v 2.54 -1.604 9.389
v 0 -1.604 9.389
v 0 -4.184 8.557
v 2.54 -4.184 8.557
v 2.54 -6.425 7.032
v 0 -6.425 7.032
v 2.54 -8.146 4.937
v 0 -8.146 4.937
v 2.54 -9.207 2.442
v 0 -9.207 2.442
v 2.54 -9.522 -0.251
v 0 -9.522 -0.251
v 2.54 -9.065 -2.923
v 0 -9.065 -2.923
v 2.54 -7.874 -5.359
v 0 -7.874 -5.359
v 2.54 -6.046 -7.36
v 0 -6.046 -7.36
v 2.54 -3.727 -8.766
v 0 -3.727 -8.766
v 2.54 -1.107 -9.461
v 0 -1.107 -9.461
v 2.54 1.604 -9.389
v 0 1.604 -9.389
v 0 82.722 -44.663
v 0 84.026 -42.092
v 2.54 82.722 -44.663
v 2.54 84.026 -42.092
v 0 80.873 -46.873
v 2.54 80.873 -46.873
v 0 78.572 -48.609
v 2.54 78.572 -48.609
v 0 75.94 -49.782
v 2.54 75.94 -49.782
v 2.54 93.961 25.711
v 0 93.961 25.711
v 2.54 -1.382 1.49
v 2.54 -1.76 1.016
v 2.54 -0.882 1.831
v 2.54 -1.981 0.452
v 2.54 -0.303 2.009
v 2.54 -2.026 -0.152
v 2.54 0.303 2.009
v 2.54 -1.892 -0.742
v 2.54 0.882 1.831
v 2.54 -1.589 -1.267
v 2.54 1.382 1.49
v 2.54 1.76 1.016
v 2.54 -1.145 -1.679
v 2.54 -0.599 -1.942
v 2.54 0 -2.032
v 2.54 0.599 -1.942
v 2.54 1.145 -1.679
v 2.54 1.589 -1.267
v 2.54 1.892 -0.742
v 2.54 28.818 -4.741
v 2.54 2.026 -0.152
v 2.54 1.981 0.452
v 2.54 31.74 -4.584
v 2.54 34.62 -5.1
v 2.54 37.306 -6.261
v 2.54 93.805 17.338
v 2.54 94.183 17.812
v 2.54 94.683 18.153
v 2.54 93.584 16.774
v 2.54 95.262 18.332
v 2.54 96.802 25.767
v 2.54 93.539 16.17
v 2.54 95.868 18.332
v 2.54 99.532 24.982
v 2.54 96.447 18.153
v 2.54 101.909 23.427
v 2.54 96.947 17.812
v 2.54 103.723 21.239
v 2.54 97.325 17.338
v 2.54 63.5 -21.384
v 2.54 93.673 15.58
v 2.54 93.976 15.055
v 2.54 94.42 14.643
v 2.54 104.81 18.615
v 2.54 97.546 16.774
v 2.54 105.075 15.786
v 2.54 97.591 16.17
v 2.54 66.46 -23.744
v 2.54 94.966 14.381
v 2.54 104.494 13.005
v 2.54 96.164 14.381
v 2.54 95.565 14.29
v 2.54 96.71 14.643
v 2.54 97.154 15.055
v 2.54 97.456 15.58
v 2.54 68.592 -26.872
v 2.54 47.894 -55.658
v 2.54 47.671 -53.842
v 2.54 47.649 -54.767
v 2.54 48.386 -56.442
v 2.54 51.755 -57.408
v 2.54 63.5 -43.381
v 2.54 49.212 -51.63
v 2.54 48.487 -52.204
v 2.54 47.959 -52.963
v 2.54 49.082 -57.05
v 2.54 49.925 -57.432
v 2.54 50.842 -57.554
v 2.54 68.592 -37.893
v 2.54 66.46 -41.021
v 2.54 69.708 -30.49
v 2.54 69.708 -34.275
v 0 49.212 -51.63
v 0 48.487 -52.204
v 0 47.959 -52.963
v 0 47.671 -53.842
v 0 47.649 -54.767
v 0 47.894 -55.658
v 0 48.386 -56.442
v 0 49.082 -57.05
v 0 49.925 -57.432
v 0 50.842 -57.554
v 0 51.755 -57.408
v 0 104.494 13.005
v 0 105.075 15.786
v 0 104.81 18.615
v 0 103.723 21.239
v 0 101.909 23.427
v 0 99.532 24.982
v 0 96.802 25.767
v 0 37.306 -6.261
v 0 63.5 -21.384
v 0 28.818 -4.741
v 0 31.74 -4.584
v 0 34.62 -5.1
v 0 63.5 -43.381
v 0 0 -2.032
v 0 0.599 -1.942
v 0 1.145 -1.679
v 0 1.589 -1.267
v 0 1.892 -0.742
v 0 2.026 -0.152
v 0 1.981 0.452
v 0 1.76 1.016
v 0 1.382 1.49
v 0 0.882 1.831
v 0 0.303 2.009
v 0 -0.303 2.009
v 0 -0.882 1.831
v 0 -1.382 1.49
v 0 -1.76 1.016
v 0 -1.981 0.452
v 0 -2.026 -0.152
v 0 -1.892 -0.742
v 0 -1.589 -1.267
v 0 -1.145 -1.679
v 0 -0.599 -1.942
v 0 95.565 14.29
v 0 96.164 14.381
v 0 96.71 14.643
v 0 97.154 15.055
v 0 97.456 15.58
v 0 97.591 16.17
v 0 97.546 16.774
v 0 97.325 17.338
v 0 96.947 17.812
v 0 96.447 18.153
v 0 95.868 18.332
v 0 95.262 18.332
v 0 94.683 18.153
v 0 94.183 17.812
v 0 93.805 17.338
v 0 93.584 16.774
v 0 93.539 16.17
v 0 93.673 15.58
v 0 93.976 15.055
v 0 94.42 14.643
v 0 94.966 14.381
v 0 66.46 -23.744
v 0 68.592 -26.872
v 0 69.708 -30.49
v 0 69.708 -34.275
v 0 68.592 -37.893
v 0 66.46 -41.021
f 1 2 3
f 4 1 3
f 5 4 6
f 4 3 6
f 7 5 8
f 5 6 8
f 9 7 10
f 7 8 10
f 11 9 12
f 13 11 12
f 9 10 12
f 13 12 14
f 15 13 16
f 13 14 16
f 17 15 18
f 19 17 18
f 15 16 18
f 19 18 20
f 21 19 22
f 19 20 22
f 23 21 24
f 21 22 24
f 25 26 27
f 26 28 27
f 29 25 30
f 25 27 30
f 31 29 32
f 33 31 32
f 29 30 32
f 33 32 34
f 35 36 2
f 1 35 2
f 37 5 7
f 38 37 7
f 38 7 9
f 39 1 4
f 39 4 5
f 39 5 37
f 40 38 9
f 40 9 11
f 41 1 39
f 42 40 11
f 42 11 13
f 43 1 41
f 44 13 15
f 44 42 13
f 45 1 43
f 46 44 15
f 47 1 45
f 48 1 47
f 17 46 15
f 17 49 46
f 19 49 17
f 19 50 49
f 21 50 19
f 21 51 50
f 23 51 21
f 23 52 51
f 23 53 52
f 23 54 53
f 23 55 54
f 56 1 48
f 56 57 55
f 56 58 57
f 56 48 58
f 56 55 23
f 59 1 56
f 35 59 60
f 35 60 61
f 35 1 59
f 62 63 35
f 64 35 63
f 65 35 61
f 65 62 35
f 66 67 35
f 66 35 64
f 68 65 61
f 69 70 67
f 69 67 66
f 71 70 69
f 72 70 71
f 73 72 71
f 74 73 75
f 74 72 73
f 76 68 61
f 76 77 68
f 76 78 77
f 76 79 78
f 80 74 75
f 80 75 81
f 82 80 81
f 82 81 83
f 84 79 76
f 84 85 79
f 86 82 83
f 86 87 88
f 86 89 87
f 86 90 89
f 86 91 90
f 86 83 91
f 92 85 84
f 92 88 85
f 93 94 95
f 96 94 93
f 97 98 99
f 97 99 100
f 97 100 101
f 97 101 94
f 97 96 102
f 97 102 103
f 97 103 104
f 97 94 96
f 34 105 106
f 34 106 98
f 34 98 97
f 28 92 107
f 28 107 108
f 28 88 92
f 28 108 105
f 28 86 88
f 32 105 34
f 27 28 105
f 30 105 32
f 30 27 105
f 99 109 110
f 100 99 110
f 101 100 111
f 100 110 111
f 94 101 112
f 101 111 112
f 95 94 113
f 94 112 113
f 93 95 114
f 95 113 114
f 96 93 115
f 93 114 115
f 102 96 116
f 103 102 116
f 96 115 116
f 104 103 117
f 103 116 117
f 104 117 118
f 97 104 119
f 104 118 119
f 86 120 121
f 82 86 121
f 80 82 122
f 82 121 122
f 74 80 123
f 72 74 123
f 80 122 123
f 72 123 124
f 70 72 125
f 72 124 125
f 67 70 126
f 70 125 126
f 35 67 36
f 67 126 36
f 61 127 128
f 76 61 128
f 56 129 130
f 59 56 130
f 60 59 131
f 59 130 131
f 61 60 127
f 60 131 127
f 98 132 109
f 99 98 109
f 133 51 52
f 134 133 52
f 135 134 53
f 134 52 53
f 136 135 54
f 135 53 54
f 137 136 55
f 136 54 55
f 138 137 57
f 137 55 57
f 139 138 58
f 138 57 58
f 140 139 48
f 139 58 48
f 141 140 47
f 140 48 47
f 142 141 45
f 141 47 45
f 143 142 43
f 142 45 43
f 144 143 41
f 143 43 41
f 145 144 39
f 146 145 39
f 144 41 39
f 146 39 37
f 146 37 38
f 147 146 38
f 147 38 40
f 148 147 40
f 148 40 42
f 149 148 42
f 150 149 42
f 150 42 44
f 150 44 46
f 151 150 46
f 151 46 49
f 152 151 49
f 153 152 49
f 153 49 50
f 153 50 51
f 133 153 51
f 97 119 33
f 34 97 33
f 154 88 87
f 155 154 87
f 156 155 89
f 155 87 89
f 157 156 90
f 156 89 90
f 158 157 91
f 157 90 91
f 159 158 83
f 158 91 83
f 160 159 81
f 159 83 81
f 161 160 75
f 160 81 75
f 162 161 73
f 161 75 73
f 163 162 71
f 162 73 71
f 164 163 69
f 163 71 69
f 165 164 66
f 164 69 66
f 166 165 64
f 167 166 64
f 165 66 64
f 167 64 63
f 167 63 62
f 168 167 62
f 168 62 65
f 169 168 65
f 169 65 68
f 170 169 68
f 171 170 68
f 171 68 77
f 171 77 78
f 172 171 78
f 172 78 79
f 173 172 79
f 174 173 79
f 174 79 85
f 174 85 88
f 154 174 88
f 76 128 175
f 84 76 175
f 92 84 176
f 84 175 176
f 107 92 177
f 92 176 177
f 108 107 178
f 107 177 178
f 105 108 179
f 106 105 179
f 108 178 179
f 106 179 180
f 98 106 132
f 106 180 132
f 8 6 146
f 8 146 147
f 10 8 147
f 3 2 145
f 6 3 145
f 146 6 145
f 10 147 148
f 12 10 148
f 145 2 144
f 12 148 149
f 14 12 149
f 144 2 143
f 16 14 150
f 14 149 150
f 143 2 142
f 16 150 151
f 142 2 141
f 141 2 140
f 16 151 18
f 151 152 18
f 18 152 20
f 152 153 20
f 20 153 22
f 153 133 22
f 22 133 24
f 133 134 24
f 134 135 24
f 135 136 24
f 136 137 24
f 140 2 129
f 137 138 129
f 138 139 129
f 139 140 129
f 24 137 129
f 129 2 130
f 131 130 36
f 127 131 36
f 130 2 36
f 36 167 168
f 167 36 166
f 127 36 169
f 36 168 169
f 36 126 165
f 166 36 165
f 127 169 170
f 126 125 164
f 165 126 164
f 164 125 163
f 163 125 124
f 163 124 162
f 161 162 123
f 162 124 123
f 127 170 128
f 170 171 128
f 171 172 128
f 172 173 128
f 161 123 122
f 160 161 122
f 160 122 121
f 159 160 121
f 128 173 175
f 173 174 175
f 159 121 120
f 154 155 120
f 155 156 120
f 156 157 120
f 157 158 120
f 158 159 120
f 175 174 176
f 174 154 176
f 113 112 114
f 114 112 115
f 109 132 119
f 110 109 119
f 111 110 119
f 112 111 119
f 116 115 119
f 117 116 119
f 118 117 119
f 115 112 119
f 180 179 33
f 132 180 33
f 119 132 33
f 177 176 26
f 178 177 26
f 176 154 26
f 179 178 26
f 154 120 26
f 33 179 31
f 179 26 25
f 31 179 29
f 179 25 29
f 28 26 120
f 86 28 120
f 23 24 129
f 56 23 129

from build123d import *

# Parameters (mm, degrees)
BOSS_EXTRUDE1_DEPTH = 2.54
SKETCH2_R           = 2.032
CUT_EXTRUDE1_DEPTH  = 120.845185189
FILLET1_R           = 12.7


with BuildPart() as part:
    # Sketch1 → Boss-Extrude1 (new body)
    with BuildSketch(Plane(origin=(0, 0, 0), x_dir=(0, 0, -1), z_dir=(1, 0, 0))):
        with BuildLine():
            Line((-25.711264461, 93.961261583), (-9.389037217, -1.603622507))
            ThreePointArc((-9.389037217, -1.603622507), (1.603622507, -9.389037217), (9.389037217, 1.603622507))
            Line((9.389037217, 1.603622507), (4.740879345, 28.818086661))
            ThreePointArc((4.740879345, 28.818086661), (4.758501249, 33.195142409), (6.261073005, 37.306250004))
            Line((6.261073005, 37.306250004), (21.384041616, 63.5))
            ThreePointArc((21.384041616, 63.5), (32.382564244, 69.85), (43.381086873, 63.5))
            Line((43.381086873, 63.5), (51.629978844, 49.2125))
            ThreePointArc((51.629978844, 49.2125), (55.658330241, 47.893886054), (57.407660819, 51.754740913))
            Line((57.407660819, 51.754740913), (47.914524724, 81.863122013))
            Line((47.914524724, 81.863122013), (-13.005337503, 104.493706378))
            ThreePointArc((-13.005337503, 104.493706378), (-22.400947675, 102.898013226), (-25.711264461, 93.961261583))
        make_face()
    extrude(amount=BOSS_EXTRUDE1_DEPTH)

    # Sketch2 → Cut-Extrude1 (cut, through all)
    with BuildSketch(Plane(origin=(2.54, 0, 0), x_dir=(0, 0, -1), z_dir=(1, 0, 0))):
        Circle(SKETCH2_R)
        with Locations((-16.322227244, 95.56488409)):
            Circle(SKETCH2_R)
    extrude(amount=-CUT_EXTRUDE1_DEPTH, mode=Mode.SUBTRACT)

    # Fillet1
    fillet1_edges = [part.edges().sort_by_distance(p)[0] for p in [
        (1.27, 81.863122013, -47.914524724),
    ]]
    fillet(fillet1_edges, radius=FILLET1_R)


solid = part.part
